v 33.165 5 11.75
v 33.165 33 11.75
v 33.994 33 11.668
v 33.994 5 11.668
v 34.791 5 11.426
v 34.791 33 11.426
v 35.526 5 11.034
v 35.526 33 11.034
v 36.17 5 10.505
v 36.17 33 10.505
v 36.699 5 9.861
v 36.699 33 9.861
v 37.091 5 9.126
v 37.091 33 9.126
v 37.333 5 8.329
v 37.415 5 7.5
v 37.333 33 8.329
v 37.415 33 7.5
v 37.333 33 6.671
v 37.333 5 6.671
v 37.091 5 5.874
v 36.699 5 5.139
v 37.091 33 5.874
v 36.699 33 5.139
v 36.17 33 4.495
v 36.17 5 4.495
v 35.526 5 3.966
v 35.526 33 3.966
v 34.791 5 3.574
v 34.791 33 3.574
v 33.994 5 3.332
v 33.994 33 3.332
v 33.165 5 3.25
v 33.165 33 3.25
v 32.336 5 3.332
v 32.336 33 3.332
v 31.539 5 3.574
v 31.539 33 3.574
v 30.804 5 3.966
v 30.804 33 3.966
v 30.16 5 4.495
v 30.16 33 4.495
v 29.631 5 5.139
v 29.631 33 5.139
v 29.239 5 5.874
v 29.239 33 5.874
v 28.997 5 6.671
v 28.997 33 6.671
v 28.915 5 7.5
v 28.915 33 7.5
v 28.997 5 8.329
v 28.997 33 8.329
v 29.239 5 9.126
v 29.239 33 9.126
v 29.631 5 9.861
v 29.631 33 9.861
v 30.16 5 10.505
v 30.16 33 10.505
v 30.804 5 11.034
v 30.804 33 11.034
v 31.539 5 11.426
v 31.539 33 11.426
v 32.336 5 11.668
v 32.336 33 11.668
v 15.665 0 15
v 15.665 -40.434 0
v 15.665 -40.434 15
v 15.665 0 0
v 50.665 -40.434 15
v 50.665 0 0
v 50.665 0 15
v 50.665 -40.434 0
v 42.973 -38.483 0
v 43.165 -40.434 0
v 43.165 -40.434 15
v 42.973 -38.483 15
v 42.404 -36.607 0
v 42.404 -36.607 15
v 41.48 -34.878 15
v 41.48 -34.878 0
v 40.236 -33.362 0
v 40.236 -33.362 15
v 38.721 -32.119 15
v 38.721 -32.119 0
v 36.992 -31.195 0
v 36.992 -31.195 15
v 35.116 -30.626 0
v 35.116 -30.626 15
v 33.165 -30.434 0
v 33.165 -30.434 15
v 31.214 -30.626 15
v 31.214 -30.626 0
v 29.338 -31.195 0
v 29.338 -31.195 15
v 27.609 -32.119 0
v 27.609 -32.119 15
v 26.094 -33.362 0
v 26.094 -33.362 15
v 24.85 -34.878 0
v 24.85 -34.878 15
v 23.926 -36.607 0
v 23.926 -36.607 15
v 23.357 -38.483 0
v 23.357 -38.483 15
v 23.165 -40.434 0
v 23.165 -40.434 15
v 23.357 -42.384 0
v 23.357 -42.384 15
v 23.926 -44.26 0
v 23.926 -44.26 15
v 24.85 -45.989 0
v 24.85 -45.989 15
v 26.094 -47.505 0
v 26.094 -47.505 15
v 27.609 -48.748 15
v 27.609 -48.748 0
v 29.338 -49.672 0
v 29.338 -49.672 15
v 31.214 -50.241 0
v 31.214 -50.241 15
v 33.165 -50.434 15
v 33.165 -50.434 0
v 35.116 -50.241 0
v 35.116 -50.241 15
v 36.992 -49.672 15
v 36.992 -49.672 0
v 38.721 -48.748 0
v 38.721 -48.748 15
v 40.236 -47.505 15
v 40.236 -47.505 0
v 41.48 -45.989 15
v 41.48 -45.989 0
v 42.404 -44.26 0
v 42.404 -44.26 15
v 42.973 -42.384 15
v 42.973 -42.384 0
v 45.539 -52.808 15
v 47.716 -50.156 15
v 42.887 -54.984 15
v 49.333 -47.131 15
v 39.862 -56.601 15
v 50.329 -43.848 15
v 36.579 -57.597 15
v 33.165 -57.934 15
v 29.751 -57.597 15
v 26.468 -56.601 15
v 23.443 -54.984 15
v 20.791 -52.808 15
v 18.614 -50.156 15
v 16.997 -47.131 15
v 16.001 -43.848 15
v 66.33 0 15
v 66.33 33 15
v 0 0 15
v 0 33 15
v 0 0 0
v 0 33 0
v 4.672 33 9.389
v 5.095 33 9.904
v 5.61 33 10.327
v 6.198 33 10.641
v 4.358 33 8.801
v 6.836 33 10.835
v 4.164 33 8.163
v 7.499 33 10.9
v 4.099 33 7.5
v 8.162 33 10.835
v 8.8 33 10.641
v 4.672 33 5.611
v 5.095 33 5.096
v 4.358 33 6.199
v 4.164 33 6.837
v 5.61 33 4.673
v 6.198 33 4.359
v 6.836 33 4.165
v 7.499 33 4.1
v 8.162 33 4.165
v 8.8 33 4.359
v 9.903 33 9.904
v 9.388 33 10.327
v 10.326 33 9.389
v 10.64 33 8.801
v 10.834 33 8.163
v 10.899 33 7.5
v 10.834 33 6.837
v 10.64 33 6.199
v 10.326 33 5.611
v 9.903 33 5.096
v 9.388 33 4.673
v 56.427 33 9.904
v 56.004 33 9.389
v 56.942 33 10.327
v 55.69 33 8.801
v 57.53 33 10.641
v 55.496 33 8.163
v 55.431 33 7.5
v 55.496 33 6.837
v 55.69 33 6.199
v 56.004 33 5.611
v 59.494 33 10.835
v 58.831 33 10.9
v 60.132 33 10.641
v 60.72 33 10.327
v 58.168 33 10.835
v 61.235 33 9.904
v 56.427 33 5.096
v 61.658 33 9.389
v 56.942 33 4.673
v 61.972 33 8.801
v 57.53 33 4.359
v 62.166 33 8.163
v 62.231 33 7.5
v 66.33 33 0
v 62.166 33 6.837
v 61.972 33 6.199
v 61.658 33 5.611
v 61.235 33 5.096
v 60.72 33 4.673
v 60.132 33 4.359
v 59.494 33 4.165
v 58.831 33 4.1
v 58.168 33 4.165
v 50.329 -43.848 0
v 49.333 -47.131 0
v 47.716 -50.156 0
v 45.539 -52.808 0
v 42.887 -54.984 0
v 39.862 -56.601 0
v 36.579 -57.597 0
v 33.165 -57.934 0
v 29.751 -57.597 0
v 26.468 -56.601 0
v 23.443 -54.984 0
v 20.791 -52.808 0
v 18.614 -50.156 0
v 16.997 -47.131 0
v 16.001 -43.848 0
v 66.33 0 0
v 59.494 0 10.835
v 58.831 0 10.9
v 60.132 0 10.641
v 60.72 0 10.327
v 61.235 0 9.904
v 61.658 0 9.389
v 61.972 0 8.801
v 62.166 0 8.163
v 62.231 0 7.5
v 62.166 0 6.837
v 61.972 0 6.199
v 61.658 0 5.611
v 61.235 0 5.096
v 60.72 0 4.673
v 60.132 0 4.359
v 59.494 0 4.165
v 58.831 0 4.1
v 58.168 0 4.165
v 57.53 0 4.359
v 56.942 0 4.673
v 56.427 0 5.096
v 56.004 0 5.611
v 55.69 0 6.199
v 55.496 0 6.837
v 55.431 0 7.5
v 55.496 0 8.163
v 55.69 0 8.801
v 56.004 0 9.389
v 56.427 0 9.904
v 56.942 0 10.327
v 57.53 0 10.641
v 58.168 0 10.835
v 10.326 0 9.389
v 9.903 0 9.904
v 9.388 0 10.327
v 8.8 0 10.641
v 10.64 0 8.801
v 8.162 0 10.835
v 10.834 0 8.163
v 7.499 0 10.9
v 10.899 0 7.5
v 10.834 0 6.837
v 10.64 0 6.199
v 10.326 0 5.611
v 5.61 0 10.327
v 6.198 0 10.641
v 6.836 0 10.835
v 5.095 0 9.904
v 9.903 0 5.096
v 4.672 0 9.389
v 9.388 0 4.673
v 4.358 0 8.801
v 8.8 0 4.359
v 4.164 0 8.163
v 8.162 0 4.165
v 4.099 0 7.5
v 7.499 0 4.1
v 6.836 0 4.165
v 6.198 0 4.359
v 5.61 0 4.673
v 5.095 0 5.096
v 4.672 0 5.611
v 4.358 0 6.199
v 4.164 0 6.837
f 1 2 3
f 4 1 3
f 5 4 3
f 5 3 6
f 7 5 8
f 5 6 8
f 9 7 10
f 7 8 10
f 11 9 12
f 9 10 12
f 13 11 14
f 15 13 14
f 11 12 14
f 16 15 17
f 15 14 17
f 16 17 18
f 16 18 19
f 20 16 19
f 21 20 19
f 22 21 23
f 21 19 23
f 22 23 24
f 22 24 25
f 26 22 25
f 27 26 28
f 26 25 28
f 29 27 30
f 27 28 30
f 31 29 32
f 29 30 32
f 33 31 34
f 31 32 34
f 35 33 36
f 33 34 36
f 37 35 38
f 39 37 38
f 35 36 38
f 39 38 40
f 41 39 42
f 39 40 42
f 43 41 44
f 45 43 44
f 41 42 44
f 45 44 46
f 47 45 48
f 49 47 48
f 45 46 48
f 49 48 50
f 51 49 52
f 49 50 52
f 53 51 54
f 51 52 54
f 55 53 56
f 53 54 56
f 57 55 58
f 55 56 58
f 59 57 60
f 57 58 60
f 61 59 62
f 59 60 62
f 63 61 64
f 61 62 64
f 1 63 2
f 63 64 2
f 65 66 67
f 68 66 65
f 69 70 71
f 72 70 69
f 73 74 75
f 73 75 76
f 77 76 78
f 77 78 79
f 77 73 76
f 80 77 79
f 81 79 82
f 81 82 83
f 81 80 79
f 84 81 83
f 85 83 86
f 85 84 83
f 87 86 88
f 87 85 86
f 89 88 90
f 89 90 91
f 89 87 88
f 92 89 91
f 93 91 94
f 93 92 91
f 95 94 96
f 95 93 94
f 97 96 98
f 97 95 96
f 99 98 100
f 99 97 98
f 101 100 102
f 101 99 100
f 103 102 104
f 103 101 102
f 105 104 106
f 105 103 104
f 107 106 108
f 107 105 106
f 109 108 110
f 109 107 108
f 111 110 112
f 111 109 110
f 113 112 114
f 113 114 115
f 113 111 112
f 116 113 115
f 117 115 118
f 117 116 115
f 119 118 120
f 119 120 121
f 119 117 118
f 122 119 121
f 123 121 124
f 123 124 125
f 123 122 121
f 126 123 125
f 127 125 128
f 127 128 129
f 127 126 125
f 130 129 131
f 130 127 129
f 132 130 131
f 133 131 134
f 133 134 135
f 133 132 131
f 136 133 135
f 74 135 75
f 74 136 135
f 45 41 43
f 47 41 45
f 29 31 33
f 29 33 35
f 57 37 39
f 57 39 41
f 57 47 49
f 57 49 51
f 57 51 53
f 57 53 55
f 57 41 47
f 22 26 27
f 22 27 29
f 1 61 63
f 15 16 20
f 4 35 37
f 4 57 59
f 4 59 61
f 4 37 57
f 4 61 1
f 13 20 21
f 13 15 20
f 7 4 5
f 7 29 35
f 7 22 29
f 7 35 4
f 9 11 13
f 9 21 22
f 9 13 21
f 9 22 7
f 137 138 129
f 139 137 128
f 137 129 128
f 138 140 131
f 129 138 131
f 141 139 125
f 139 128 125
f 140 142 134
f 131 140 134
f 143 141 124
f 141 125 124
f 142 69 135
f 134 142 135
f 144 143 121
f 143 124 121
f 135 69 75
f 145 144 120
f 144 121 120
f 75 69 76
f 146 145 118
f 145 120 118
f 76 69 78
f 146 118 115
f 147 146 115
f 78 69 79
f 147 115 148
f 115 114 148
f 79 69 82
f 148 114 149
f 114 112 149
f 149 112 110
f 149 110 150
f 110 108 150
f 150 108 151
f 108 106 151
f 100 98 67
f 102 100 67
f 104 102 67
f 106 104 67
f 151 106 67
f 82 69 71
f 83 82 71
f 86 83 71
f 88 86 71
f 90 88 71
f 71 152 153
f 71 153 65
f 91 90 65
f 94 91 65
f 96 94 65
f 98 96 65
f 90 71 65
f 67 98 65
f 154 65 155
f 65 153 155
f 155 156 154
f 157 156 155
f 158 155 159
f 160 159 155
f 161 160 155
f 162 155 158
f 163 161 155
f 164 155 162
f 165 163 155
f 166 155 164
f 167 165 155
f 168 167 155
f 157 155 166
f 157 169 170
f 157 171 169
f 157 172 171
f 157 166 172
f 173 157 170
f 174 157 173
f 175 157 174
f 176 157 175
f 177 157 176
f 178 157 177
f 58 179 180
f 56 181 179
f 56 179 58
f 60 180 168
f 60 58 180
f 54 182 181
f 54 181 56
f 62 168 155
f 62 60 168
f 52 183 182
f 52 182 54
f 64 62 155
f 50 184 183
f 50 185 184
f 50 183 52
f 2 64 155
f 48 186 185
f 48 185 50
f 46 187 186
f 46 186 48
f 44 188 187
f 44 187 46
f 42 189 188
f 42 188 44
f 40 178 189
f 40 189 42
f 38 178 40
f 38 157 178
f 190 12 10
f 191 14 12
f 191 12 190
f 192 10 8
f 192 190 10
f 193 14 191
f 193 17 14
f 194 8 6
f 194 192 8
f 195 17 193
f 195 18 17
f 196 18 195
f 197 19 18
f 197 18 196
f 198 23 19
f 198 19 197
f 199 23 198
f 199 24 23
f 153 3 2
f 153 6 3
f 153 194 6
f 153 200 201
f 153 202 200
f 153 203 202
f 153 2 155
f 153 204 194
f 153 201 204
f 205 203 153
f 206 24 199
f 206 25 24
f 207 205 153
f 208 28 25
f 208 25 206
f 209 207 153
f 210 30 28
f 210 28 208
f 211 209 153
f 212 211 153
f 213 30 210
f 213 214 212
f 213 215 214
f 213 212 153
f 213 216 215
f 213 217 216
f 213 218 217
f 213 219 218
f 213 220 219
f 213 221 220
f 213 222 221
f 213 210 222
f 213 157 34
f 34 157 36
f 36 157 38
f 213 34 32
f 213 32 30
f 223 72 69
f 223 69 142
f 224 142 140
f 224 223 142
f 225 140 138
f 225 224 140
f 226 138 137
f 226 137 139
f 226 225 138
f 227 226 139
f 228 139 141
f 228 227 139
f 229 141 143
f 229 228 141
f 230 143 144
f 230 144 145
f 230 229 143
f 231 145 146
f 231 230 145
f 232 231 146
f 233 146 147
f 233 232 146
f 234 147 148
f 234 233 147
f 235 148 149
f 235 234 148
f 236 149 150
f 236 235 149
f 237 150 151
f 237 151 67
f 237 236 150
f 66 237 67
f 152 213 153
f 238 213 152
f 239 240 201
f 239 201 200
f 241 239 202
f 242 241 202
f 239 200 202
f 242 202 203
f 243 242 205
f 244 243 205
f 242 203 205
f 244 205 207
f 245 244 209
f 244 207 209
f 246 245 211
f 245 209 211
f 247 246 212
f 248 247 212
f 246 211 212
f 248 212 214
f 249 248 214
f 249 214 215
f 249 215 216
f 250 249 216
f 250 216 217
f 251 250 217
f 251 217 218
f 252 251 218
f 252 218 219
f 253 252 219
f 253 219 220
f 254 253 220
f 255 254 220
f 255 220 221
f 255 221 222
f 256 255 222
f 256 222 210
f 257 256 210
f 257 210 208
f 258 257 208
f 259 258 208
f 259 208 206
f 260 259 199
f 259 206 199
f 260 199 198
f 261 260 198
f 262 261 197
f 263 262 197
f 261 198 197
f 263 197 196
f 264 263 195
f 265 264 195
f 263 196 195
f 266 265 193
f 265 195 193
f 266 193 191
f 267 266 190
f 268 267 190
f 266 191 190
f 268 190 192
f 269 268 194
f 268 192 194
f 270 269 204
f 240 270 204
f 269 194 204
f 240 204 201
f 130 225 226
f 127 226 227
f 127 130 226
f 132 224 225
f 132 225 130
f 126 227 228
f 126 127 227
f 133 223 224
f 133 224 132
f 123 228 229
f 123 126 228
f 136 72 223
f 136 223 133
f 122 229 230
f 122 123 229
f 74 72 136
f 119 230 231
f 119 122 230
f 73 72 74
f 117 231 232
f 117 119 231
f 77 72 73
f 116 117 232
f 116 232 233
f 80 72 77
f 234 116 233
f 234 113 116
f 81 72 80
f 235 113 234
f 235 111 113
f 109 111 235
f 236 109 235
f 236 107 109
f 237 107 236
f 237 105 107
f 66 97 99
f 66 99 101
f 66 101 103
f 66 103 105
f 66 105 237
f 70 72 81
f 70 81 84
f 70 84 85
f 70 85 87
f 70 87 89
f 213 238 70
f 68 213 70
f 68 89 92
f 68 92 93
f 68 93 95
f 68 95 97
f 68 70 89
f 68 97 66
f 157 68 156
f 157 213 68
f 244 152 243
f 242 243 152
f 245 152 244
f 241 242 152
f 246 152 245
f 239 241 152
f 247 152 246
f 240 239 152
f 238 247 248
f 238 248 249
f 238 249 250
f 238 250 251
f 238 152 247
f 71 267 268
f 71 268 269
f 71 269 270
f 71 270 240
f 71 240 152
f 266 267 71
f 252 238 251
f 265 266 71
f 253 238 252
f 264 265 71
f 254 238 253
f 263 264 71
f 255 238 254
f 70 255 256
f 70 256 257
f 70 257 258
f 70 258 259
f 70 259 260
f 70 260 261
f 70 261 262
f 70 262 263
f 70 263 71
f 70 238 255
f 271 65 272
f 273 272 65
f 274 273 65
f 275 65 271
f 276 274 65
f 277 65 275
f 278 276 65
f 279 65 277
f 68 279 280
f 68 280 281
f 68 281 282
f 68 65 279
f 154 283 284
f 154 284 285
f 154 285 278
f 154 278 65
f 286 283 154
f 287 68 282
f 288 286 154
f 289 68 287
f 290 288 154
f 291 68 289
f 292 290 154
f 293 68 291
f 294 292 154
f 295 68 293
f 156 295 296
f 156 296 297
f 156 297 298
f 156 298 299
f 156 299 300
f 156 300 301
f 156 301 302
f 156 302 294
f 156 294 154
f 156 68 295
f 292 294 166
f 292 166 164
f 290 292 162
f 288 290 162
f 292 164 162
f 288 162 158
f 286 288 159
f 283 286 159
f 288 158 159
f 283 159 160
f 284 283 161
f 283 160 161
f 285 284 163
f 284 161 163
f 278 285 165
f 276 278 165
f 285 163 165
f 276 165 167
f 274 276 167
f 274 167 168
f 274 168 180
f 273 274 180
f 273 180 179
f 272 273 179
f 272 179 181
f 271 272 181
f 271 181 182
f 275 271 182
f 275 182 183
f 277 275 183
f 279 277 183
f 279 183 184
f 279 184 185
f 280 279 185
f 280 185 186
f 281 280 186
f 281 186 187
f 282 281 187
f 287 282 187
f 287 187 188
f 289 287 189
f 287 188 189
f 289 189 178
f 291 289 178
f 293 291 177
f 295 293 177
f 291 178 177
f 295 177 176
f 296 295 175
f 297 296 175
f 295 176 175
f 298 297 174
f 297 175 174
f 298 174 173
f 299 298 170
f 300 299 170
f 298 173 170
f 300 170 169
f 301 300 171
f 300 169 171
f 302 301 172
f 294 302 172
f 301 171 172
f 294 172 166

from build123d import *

# Parameters (mm, degrees)
SKETCH1_R           = 10
BOSS_EXTRUDE1_DEPTH = 15
SKETCH2_R           = 3.4
CUT_EXTRUDE1_DEPTH  = 54
SKETCH3_R           = 4.25
CUT_EXTRUDE2_DEPTH  = 28


with BuildPart() as part:
    # Sketch1 → Boss-Extrude1 (new body)
    with BuildSketch(Plane.XY):
        with BuildLine():
            Line((0, 0), (0, 33))
            Line((0, 33), (66.33, 33))
            Line((66.33, 33), (66.33, 0))
            Line((66.33, 0), (50.665, 0))
            Line((50.665, 0), (50.665, -40.433566532))
            ThreePointArc((50.665, -40.433566532), (33.165, -57.933566532), (15.665, -40.433566532))
            Line((15.665, -40.433566532), (15.665, 0))
            Line((15.665, 0), (0, 0))
        make_face()
        with Locations((33.165, -40.433566532)):
            Circle(SKETCH1_R, mode=Mode.SUBTRACT)
    extrude(amount=BOSS_EXTRUDE1_DEPTH)

    # Sketch2 → Cut-Extrude1 (cut)
    with BuildSketch(Plane(origin=(0, 33, 0), x_dir=(1, 0, 0), z_dir=(0, 1, 0))):
        with Locations(Location((58.831, -7.5, 0), (0, 0, 270))):
            Circle(SKETCH2_R)
        with Locations(Location((7.499, -7.5, 0), (0, 0, 180))):
            Circle(SKETCH2_R)
    extrude(amount=-CUT_EXTRUDE1_DEPTH, mode=Mode.SUBTRACT)

    # Sketch3 → Cut-Extrude2 (cut)
    with BuildSketch(Plane(origin=(0, 33, 0), x_dir=(1, 0, 0), z_dir=(0, 1, 0))):
        with Locations(Location((33.165, -7.5, 0), (0, 0, 270))):
            Circle(SKETCH3_R)
    extrude(amount=-CUT_EXTRUDE2_DEPTH, mode=Mode.SUBTRACT)


solid = part.part
